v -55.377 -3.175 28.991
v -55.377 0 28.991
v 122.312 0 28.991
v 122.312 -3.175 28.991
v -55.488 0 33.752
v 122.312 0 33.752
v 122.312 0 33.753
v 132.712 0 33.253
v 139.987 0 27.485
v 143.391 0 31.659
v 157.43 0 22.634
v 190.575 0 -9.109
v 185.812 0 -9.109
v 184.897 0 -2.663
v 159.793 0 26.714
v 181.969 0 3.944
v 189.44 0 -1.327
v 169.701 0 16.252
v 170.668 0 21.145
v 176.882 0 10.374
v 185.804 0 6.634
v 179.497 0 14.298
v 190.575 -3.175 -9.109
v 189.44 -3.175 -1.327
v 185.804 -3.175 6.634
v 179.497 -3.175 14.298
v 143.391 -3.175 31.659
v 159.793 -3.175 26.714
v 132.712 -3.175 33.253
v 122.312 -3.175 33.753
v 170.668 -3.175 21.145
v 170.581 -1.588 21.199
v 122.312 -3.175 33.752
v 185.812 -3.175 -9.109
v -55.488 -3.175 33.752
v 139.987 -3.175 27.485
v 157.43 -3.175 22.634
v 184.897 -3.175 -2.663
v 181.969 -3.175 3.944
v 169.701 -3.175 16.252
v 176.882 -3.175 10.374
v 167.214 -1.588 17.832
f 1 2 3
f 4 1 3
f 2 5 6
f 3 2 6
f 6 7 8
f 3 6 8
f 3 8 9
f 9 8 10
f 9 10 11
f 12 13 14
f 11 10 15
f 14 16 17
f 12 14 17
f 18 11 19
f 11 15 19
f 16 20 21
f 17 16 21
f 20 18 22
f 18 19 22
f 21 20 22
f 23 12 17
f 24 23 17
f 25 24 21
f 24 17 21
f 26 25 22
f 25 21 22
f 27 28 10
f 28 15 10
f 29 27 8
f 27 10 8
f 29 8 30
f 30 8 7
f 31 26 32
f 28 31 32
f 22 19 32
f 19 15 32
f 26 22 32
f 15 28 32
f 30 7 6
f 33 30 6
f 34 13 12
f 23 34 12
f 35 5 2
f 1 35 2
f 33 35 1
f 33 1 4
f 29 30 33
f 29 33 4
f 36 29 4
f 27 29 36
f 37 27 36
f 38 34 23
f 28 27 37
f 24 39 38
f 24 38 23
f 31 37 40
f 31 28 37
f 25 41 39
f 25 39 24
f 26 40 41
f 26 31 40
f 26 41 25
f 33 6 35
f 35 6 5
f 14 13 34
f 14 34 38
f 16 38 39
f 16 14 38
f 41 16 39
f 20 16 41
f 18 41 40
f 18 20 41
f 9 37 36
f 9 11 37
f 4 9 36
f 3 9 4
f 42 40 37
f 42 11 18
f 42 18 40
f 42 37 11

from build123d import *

# Parameters (mm, degrees)
F1_DEPTH = 3.175


with BuildPart() as f1:
    # F0 (on Front) → F1 (new body)
    with BuildSketch(Plane.XZ):
        with BuildLine():
            Line((122.3122592662, 33.7521504266), (-55.4877407338, 33.7521504266))
            Line((-55.4877407338, 33.7521504266), (-55.3766458406, 28.9909463589))
            Line((-55.3766458406, 28.9909463589), (122.3122592662, 28.9909463589))
            add(Edge.make_bspline(
                [(185.8122592662, -9.1090536411), (185.8122592662, 28.9909463589), (122.3122592662, 28.9909463589)],
                knots=[0, 0, 0, 1.5707963268, 1.5707963268, 1.5707963268], degree=2, weights=[1, 0.7071067812, 1]))
            Line((185.8122592662, -9.1090536411), (190.5747592662, -9.1090536411))
            add(Edge.make_bspline(
                [(190.5747592662, -9.1090536411), (190.5747592662, 33.7534463589), (122.3122592662, 33.7534463589)],
                knots=[0, 0, 0, 1.5707963268, 1.5707963268, 1.5707963268], degree=2, weights=[1, 0.7071067812, 1]))
            Line((122.3122592662, 33.7534463589), (122.3122592662, 33.7521504266))
        make_face()
    extrude(amount=F1_DEPTH)


solid = f1.part
